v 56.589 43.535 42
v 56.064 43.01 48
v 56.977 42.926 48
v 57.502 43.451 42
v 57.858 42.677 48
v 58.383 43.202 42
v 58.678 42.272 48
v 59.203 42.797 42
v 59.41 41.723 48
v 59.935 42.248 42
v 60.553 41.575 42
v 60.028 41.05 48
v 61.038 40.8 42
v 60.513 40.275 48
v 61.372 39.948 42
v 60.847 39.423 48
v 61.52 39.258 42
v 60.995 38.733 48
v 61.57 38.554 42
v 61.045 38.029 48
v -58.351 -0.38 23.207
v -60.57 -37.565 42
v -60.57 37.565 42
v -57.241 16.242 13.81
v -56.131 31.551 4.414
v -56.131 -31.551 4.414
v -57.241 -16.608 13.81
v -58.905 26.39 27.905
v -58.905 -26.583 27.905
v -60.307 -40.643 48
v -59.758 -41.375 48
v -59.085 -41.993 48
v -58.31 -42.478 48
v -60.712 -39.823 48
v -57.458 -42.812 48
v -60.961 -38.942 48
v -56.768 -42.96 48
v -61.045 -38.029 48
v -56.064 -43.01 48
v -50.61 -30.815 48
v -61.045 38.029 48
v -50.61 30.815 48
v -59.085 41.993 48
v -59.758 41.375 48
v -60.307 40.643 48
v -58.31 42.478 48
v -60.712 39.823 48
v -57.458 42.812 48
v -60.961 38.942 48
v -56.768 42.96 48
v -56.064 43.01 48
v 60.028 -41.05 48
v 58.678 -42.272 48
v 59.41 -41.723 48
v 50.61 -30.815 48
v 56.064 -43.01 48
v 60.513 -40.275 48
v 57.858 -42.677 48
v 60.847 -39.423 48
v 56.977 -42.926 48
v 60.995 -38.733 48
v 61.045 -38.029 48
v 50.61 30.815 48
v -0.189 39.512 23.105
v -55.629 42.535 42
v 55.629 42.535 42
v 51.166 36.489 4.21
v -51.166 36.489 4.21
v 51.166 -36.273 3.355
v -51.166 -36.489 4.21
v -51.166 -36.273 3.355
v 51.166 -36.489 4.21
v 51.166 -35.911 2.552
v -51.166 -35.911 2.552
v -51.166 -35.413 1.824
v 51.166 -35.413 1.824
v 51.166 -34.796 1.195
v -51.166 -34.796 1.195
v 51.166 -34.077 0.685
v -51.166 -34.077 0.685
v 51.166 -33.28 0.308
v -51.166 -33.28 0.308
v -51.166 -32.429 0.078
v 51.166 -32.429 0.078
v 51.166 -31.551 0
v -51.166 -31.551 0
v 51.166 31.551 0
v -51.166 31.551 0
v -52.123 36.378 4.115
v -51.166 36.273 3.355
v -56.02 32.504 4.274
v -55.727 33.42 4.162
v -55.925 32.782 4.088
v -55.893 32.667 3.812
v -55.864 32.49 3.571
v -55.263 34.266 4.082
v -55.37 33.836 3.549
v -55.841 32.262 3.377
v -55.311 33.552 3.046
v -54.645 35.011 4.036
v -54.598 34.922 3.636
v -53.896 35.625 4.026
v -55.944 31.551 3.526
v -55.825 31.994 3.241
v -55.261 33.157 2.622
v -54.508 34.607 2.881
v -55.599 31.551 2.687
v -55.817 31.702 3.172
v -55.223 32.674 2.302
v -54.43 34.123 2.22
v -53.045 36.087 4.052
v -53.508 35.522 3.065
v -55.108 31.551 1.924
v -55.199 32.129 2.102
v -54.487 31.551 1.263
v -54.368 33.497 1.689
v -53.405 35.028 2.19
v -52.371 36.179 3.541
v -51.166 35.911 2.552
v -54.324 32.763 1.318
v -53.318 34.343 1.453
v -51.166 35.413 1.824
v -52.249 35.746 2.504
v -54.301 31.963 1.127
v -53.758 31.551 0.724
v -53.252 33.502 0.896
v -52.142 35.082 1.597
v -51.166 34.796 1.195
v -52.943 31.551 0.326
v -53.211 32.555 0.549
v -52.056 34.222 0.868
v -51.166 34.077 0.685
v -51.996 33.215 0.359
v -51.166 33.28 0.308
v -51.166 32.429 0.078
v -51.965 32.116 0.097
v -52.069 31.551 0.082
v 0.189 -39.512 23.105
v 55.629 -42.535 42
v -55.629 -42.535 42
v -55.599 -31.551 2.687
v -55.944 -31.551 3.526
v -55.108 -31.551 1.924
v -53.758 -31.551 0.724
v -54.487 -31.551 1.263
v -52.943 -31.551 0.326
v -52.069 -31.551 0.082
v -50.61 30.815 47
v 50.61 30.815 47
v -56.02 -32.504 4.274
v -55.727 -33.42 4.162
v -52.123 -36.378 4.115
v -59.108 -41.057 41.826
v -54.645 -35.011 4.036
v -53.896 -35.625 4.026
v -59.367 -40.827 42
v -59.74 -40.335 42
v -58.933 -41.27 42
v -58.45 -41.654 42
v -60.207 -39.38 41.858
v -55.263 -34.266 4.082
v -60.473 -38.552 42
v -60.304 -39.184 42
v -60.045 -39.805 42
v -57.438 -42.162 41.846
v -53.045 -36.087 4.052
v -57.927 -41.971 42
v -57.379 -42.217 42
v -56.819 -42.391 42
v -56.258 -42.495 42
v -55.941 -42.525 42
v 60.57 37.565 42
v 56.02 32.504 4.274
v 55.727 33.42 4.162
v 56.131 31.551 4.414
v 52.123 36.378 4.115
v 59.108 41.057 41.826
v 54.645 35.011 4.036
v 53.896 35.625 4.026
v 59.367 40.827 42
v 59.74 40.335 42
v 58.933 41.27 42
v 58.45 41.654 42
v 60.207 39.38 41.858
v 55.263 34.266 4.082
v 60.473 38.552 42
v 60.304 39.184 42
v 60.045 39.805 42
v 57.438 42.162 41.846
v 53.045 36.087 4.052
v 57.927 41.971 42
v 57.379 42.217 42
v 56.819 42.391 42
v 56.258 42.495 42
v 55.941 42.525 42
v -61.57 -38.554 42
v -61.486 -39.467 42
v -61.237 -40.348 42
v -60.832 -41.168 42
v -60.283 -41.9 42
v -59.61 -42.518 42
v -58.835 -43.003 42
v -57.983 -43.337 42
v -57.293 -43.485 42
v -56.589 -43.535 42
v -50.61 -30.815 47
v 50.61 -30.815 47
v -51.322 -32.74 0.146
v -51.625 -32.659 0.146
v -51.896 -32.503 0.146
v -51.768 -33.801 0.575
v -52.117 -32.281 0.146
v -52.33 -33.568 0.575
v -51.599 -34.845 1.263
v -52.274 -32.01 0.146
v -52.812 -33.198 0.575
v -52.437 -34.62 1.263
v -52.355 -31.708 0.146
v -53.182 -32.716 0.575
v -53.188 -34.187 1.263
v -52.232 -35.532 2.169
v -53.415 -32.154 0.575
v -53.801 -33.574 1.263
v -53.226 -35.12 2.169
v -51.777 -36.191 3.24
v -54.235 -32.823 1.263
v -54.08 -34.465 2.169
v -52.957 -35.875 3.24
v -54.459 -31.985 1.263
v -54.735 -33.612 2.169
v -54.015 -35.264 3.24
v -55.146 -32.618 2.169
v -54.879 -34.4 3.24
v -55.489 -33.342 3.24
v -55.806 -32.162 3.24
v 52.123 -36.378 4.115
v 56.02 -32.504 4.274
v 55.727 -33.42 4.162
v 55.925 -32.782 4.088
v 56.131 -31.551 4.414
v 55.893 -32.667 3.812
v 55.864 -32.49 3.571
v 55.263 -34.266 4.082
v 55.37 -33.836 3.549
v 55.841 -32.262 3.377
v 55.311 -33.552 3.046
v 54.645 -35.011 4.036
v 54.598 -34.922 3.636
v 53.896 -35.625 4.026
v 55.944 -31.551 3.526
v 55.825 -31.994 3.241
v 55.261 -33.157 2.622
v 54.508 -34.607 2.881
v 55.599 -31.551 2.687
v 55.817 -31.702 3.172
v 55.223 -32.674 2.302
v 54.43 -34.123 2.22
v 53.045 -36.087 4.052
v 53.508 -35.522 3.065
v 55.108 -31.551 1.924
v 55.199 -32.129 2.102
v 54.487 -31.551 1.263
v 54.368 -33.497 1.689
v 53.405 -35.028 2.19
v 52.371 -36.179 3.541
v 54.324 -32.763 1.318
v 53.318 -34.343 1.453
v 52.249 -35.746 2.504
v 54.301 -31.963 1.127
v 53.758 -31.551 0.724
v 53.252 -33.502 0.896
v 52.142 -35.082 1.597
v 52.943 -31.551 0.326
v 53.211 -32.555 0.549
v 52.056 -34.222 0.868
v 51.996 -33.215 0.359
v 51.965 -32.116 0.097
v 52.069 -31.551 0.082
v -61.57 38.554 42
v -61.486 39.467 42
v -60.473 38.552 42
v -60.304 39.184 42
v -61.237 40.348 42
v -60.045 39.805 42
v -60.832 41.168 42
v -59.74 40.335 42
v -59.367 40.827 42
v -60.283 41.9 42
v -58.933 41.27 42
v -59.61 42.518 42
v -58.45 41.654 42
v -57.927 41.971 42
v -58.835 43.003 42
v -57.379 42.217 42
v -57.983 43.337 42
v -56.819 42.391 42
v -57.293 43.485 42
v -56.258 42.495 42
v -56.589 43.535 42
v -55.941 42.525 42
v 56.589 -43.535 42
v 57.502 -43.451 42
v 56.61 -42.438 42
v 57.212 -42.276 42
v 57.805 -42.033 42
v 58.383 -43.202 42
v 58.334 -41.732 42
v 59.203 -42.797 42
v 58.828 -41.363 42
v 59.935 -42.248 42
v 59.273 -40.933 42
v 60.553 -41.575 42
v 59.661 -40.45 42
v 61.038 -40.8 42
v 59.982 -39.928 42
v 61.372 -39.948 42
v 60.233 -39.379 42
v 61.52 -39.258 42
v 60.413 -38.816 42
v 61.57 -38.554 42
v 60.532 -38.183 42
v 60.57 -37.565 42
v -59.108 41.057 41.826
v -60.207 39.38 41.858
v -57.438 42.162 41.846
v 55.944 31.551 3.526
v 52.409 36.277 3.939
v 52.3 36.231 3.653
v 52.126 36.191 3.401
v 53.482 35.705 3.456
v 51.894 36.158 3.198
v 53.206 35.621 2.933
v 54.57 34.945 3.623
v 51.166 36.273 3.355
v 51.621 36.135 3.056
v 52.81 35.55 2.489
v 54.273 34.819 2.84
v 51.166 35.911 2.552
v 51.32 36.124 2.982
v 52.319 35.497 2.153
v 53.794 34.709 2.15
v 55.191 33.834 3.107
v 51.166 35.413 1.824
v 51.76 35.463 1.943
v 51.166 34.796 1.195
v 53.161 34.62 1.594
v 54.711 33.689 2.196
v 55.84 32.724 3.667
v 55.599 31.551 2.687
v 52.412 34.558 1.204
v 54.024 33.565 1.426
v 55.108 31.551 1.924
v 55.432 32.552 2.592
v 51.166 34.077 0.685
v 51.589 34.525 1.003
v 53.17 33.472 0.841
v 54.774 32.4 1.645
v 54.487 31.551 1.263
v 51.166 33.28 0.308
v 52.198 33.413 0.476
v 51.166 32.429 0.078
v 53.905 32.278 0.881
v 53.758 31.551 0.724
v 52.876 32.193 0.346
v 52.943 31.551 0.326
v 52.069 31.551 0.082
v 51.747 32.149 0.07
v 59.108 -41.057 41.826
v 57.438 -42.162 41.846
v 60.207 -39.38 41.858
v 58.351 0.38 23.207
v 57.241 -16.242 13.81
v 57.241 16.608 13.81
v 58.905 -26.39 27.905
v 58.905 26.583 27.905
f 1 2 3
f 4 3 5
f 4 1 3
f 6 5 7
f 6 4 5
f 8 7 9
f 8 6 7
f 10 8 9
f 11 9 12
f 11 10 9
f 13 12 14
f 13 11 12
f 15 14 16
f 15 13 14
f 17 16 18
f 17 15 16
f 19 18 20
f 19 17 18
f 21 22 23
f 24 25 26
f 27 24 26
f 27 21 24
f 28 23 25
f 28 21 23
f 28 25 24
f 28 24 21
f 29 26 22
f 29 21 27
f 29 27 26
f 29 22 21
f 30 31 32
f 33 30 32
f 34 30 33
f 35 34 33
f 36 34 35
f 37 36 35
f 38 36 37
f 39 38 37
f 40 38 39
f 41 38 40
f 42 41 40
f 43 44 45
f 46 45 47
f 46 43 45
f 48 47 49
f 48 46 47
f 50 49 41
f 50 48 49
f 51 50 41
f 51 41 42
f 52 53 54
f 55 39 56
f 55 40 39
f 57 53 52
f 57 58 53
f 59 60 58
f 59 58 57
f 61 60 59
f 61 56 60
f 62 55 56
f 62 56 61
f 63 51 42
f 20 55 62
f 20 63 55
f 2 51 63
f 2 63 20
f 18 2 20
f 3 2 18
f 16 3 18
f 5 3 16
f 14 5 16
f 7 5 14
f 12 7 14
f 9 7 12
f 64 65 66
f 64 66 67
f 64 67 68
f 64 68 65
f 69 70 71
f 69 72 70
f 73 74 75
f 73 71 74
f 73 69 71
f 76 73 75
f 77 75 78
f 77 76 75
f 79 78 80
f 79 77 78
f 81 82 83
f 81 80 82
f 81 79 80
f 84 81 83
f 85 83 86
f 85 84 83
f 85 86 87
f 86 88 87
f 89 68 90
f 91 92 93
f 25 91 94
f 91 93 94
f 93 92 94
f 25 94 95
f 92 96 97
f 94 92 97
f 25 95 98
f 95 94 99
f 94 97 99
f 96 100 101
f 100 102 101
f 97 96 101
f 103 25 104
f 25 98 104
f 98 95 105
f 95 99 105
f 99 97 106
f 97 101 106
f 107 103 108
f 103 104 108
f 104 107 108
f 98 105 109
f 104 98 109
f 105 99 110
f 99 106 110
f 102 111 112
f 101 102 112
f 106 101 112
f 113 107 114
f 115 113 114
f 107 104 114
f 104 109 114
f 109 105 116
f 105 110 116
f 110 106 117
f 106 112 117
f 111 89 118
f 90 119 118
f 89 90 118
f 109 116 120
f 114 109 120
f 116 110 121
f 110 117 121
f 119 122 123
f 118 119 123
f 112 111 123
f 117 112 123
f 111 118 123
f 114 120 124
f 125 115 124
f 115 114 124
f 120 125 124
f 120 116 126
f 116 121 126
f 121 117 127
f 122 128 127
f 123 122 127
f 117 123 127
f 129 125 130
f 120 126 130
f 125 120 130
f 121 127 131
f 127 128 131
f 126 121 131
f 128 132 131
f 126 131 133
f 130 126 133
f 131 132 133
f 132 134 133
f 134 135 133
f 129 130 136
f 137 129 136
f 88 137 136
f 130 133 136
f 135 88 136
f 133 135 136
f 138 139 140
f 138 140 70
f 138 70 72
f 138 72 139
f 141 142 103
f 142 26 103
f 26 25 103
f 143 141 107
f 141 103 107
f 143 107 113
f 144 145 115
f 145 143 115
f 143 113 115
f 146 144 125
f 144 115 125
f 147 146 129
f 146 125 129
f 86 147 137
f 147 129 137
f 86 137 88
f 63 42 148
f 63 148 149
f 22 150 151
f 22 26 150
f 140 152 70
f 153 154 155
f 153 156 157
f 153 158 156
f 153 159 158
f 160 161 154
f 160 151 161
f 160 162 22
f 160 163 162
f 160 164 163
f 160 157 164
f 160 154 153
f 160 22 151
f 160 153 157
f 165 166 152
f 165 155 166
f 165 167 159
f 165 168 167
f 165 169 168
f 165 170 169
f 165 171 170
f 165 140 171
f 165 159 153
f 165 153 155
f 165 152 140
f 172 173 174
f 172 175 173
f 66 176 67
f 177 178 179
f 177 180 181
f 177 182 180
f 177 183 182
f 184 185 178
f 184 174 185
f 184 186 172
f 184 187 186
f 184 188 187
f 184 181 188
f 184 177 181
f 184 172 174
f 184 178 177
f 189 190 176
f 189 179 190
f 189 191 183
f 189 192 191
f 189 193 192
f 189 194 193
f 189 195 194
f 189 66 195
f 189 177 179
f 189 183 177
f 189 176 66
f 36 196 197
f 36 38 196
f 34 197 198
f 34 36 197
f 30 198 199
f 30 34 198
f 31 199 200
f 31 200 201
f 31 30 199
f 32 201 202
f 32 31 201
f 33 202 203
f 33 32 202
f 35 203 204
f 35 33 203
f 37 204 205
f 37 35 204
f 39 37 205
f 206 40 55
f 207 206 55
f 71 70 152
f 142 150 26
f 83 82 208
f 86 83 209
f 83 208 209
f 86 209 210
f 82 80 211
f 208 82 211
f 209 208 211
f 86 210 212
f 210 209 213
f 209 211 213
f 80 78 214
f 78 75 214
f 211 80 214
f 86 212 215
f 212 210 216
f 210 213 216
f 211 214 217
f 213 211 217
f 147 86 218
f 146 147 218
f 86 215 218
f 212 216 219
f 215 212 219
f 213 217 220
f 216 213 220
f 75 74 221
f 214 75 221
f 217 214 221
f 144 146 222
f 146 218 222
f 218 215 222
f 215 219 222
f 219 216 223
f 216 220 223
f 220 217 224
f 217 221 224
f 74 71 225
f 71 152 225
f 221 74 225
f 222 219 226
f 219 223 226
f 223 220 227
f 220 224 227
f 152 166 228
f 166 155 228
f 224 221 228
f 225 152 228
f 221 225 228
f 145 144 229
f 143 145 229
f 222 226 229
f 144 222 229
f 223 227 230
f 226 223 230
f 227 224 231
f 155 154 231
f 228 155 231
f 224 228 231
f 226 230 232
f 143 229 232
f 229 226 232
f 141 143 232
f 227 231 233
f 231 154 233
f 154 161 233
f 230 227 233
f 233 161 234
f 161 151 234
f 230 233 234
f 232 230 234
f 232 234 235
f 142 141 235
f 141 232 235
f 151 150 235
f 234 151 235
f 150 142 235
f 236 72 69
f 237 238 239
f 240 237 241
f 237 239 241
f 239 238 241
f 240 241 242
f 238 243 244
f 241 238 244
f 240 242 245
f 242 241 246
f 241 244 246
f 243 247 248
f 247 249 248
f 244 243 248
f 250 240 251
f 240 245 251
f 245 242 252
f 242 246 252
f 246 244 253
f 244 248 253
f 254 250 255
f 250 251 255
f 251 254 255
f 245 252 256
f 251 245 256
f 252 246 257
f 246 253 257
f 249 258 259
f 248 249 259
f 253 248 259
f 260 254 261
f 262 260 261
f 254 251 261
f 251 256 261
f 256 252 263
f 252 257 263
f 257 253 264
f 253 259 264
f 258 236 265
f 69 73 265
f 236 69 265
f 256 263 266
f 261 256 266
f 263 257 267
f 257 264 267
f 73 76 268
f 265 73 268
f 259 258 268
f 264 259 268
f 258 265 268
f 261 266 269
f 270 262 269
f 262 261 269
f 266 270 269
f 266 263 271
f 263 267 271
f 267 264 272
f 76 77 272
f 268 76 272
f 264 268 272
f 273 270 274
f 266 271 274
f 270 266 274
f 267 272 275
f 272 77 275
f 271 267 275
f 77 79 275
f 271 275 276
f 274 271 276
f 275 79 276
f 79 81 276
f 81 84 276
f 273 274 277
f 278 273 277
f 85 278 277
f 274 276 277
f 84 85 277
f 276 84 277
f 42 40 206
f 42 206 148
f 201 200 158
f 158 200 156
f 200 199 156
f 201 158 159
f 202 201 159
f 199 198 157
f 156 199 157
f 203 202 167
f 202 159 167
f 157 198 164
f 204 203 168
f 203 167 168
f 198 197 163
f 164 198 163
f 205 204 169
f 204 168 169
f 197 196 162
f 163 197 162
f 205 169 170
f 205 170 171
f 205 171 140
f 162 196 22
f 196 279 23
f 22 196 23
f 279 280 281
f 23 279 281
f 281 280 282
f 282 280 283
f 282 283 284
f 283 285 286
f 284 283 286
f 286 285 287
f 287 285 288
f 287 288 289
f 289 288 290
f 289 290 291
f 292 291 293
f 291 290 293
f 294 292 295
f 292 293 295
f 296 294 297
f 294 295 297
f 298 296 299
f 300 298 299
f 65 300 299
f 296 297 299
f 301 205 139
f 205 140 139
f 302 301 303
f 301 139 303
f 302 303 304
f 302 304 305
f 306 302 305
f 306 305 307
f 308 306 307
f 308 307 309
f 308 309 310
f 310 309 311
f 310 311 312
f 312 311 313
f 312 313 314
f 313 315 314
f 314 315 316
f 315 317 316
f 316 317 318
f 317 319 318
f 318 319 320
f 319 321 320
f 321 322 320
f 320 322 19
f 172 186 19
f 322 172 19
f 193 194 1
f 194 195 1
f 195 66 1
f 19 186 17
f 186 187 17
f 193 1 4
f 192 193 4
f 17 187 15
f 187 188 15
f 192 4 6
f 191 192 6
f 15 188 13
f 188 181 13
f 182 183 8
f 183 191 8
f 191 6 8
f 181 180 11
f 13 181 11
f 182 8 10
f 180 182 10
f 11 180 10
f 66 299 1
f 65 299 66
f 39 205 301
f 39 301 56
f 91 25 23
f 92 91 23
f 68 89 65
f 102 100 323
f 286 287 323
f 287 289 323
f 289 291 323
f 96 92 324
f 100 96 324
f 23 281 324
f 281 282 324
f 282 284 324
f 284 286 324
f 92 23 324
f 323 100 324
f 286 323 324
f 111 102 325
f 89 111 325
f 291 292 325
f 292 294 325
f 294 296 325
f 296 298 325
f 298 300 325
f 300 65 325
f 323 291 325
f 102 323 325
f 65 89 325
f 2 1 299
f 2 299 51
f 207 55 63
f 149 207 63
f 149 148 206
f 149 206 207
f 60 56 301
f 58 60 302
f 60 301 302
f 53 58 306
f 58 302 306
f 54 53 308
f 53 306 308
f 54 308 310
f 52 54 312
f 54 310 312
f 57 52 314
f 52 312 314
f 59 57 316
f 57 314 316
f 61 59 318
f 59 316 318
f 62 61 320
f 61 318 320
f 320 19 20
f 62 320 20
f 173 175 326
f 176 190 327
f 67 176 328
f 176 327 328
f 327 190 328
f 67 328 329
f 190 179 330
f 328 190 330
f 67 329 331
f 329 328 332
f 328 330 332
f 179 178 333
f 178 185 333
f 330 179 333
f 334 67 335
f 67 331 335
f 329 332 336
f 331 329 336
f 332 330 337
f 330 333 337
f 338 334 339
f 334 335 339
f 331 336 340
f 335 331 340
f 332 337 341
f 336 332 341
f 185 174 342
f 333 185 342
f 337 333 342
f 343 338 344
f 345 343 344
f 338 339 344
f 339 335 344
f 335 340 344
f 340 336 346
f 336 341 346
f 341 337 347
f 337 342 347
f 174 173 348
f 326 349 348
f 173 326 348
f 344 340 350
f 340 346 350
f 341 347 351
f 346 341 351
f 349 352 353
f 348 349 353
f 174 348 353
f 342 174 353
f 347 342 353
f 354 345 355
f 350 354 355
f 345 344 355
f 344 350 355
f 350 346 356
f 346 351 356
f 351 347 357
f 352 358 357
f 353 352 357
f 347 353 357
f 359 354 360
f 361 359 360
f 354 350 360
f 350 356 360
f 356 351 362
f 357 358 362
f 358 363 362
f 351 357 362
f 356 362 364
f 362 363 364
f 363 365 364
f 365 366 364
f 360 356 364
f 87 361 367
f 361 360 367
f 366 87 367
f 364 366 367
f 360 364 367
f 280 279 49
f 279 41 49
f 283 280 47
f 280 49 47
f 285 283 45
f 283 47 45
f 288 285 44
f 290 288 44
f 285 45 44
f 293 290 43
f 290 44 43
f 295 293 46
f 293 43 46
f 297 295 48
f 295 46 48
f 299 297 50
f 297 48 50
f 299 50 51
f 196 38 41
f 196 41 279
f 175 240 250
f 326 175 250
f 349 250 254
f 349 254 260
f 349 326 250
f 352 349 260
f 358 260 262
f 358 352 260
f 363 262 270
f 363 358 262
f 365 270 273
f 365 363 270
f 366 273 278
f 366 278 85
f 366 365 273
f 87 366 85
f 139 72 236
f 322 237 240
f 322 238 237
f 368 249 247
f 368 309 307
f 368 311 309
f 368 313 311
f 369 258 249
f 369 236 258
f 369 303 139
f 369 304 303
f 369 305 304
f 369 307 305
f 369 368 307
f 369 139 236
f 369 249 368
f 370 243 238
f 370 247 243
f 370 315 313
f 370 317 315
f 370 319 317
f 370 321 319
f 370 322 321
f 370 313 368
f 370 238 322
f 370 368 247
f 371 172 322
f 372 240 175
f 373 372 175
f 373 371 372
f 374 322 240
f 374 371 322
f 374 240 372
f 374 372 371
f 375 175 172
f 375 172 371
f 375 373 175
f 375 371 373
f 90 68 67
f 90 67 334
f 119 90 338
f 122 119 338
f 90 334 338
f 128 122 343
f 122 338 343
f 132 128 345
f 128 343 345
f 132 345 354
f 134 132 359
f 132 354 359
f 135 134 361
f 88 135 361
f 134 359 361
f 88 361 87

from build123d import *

# Parameters (mm, degrees)
F0_W        = 111.22
F0_H        = 71.63
F2_W        = 121.14
F2_H        = 85.07
F4_R        = 5
F6_W        = 123.14
F6_H        = 87.07
F7_DEPTH    = 6
F8_T1_DEPTH = 154.335608958
F8_T3_DEPTH = 118.265608958
F10_W       = 101.22
F10_H       = 61.63
F11_DEPTH   = 1
F12_R       = 5


# Not quite as in the source:
# - a fillet or chamfer that OpenCascade refuses, or shapes differently, is made with other operations: its cross-section is extruded or revolved along the edge and cut away or added


with BuildPart() as f3:
    # F0 (on Top) → F3 section 0
    with BuildSketch(Plane.XY):
        Rectangle(F0_W, F0_H)
    # F2 (on offset) → F3 section 1
    with BuildSketch(Plane.XY.offset(42)):
        Rectangle(F2_W, F2_H)
    loft()

    # F4
    f4_edges = [f3.edges().sort_by_distance(p)[0] for p in [
        (-58.09, -39.175, 21),
        (0, -35.815, 0),
        (58.09, -39.175, 21),
        (55.61, 0, 0),
        (58.09, 39.175, 21),
        (0, 35.815, 0),
        (-58.09, 39.175, 21),
        (-55.61, 0, 0),
    ]]
    fillet(f4_edges, radius=F4_R)

    # F6 (on offset) → F7 (join)
    with BuildSketch(Plane.XY.offset(42)):
        Rectangle(F6_W, F6_H)
    extrude(amount=F7_DEPTH)

    # F8: chamfer of 6 x 0.5249319812 on 4 edges, made by hand

    # F8_s2 → F8_t1 (cut)
    with BuildSketch(Plane.YZ.offset(-77.167804479)):
        Polygon((-43.535, 42), (-43.0100680188, 48), (-43.535, 48), align=None)
        Polygon((43.535, 42), (43.0100680188, 48), (43.535, 48), align=None)
    extrude(amount=F8_T1_DEPTH, mode=Mode.SUBTRACT)

    # F8_s4 → F8_t3 (cut)
    with BuildSketch(Plane.XZ.offset(-59.132804479)):
        Polygon((-61.0450680188, 48), (-61.57, 42), (-61.57, 48), align=None)
        Polygon((61.57, 42), (61.0450680188, 48), (61.57, 48), align=None)
    extrude(amount=F8_T3_DEPTH, mode=Mode.SUBTRACT)

    # F10 (on offset) → F11 (cut)
    with BuildSketch(Plane.XY.offset(48)):
        Rectangle(F10_W, F10_H)
    extrude(amount=-F11_DEPTH, mode=Mode.SUBTRACT)

    # F12
    f12_edges = [f3.edges().sort_by_distance(p)[0] for p in [
        (-61.307534, -43.272534, 45),
        (61.307534, -43.272534, 45),
        (61.307534, 43.272534, 45),
        (-61.307534, 43.272534, 45),
    ]]
    fillet(f12_edges, radius=F12_R)


solid = f3.part
